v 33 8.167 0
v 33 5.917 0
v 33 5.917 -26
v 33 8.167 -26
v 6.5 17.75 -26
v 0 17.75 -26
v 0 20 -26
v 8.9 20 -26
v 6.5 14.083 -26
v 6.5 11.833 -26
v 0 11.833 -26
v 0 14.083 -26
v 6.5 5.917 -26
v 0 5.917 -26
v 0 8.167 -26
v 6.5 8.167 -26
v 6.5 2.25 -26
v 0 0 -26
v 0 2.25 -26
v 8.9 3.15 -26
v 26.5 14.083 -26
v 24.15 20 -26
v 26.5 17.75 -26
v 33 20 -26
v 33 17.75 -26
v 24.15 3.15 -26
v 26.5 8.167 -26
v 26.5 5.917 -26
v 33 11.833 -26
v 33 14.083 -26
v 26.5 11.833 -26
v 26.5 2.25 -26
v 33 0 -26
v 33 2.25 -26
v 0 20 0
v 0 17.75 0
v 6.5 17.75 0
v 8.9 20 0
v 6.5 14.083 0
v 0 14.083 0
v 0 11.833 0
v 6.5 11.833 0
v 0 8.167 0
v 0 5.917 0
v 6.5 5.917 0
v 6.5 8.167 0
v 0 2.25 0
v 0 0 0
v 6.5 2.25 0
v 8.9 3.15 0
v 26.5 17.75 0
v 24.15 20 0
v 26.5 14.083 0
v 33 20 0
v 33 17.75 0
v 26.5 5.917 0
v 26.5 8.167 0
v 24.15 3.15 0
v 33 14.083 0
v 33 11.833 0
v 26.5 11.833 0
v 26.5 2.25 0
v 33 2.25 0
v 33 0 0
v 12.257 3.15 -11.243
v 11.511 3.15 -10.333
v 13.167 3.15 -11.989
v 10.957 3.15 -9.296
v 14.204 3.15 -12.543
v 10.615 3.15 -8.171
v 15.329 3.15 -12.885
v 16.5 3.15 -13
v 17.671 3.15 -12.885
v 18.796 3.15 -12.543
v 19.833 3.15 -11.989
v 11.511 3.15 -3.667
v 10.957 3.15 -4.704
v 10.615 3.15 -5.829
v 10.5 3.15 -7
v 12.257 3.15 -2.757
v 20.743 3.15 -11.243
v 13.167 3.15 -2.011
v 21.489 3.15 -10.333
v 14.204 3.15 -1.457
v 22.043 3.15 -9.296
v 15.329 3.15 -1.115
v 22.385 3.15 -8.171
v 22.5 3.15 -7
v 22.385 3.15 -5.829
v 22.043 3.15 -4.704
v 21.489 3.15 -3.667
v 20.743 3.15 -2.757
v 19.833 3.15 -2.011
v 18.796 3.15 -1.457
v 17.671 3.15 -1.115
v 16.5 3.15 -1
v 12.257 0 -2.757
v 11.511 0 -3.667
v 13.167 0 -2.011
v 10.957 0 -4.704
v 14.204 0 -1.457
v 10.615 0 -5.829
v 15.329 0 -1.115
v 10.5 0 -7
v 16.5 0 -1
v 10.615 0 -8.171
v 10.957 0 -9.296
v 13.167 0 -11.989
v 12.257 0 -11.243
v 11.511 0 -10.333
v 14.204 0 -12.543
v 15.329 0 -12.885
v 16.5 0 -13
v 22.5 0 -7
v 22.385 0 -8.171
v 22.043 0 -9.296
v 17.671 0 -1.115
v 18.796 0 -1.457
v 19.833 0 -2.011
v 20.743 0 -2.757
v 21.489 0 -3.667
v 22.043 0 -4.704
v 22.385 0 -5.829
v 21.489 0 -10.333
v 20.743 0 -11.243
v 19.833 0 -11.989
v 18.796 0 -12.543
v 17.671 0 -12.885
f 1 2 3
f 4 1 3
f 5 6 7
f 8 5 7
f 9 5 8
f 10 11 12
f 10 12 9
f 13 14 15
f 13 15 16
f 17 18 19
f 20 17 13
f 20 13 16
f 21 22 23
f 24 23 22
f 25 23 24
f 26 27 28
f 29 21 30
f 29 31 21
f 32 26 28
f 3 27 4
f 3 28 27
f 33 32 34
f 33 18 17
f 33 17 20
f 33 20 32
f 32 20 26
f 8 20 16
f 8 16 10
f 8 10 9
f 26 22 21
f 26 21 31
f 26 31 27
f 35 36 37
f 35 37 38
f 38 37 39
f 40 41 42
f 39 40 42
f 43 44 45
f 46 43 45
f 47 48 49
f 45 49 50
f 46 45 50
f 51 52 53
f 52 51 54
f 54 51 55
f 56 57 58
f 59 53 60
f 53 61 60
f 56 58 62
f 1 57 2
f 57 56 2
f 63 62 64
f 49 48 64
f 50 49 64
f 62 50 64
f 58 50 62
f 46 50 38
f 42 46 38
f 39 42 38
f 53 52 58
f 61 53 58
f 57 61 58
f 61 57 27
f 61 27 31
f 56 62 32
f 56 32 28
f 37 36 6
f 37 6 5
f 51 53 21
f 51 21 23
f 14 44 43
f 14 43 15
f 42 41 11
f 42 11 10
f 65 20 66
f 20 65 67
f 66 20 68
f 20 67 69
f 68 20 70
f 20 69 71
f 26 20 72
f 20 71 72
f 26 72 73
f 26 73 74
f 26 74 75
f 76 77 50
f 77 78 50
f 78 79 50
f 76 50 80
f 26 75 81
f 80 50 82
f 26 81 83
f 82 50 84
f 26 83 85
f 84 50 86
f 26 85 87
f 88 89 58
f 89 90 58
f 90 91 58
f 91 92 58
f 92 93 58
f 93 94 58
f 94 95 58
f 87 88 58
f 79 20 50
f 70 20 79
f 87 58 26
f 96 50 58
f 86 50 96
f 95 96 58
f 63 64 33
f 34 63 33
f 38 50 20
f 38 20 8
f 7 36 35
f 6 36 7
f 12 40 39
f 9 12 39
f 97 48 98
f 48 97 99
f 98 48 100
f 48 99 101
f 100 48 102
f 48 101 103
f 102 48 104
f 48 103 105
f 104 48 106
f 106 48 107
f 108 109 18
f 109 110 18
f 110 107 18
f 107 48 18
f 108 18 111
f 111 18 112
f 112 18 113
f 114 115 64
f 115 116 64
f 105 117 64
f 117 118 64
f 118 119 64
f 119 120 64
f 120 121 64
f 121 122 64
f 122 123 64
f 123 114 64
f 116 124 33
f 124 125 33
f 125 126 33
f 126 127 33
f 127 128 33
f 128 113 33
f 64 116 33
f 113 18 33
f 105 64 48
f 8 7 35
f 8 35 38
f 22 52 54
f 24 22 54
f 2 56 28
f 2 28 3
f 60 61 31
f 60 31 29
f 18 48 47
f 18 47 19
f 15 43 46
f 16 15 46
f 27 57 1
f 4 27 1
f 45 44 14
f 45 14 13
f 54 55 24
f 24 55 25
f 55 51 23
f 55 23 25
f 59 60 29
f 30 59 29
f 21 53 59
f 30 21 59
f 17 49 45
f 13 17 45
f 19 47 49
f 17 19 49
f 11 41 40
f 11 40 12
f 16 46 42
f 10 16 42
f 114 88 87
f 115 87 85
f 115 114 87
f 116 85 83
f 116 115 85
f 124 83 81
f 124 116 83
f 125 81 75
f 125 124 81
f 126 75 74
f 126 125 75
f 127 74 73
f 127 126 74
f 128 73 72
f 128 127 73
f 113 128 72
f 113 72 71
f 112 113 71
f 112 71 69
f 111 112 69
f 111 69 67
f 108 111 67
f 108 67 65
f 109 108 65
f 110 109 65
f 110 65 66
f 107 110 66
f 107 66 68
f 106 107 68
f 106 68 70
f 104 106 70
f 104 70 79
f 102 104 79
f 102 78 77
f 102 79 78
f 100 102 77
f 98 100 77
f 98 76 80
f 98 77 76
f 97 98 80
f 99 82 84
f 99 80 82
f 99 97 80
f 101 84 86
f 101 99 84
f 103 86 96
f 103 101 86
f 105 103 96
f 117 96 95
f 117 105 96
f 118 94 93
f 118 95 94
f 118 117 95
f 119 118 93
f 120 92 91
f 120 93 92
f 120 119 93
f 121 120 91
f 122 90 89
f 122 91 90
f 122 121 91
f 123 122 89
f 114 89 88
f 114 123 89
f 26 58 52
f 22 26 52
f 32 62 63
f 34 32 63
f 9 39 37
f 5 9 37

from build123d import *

# Parameters (mm, degrees)
SKETCH1_W           = 33
SKETCH1_H           = 26
SKETCH1_R           = 6
BOSS_EXTRUDE1_DEPTH = 20
SKETCH2_W           = 6.5
SKETCH2_H           = 3.666666667
SKETCH2_H_2         = 3.666666666
SKETCH2_W_2         = 15.25
SKETCH2_H_3         = 16.85
CUT_EXTRUDE1_DEPTH  = 26


with BuildPart() as part:
    # Sketch1 → Boss-Extrude1 (new body)
    with BuildSketch(Plane(origin=(0, 0, 0), x_dir=(1, 0, 0), z_dir=(0, 1, 0))):
        with Locations((16.5, 13)):
            Rectangle(SKETCH1_W, SKETCH1_H)
        with Locations((16.5, 7)):
            Circle(SKETCH1_R, mode=Mode.SUBTRACT)
    extrude(amount=BOSS_EXTRUDE1_DEPTH)

    # Sketch2 → Cut-Extrude1 (cut)
    with BuildSketch(Plane.XY):
        with Locations((3.25, 4.083333334)):
            Rectangle(SKETCH2_W, SKETCH2_H)
        with Locations((3.25, 10)):
            Rectangle(SKETCH2_W, SKETCH2_H_2)
        with Locations((3.25, 15.916666666)):
            Rectangle(SKETCH2_W, SKETCH2_H)
        with Locations((29.75, 15.916666666)):
            Rectangle(SKETCH2_W, SKETCH2_H)
        with Locations((29.75, 10)):
            Rectangle(SKETCH2_W, SKETCH2_H_2)
        with Locations((29.75, 4.083333334)):
            Rectangle(SKETCH2_W, SKETCH2_H)
        with Locations((16.525, 11.575)):
            Rectangle(SKETCH2_W_2, SKETCH2_H_3)
    extrude(amount=-CUT_EXTRUDE1_DEPTH, mode=Mode.SUBTRACT)


solid = part.part
